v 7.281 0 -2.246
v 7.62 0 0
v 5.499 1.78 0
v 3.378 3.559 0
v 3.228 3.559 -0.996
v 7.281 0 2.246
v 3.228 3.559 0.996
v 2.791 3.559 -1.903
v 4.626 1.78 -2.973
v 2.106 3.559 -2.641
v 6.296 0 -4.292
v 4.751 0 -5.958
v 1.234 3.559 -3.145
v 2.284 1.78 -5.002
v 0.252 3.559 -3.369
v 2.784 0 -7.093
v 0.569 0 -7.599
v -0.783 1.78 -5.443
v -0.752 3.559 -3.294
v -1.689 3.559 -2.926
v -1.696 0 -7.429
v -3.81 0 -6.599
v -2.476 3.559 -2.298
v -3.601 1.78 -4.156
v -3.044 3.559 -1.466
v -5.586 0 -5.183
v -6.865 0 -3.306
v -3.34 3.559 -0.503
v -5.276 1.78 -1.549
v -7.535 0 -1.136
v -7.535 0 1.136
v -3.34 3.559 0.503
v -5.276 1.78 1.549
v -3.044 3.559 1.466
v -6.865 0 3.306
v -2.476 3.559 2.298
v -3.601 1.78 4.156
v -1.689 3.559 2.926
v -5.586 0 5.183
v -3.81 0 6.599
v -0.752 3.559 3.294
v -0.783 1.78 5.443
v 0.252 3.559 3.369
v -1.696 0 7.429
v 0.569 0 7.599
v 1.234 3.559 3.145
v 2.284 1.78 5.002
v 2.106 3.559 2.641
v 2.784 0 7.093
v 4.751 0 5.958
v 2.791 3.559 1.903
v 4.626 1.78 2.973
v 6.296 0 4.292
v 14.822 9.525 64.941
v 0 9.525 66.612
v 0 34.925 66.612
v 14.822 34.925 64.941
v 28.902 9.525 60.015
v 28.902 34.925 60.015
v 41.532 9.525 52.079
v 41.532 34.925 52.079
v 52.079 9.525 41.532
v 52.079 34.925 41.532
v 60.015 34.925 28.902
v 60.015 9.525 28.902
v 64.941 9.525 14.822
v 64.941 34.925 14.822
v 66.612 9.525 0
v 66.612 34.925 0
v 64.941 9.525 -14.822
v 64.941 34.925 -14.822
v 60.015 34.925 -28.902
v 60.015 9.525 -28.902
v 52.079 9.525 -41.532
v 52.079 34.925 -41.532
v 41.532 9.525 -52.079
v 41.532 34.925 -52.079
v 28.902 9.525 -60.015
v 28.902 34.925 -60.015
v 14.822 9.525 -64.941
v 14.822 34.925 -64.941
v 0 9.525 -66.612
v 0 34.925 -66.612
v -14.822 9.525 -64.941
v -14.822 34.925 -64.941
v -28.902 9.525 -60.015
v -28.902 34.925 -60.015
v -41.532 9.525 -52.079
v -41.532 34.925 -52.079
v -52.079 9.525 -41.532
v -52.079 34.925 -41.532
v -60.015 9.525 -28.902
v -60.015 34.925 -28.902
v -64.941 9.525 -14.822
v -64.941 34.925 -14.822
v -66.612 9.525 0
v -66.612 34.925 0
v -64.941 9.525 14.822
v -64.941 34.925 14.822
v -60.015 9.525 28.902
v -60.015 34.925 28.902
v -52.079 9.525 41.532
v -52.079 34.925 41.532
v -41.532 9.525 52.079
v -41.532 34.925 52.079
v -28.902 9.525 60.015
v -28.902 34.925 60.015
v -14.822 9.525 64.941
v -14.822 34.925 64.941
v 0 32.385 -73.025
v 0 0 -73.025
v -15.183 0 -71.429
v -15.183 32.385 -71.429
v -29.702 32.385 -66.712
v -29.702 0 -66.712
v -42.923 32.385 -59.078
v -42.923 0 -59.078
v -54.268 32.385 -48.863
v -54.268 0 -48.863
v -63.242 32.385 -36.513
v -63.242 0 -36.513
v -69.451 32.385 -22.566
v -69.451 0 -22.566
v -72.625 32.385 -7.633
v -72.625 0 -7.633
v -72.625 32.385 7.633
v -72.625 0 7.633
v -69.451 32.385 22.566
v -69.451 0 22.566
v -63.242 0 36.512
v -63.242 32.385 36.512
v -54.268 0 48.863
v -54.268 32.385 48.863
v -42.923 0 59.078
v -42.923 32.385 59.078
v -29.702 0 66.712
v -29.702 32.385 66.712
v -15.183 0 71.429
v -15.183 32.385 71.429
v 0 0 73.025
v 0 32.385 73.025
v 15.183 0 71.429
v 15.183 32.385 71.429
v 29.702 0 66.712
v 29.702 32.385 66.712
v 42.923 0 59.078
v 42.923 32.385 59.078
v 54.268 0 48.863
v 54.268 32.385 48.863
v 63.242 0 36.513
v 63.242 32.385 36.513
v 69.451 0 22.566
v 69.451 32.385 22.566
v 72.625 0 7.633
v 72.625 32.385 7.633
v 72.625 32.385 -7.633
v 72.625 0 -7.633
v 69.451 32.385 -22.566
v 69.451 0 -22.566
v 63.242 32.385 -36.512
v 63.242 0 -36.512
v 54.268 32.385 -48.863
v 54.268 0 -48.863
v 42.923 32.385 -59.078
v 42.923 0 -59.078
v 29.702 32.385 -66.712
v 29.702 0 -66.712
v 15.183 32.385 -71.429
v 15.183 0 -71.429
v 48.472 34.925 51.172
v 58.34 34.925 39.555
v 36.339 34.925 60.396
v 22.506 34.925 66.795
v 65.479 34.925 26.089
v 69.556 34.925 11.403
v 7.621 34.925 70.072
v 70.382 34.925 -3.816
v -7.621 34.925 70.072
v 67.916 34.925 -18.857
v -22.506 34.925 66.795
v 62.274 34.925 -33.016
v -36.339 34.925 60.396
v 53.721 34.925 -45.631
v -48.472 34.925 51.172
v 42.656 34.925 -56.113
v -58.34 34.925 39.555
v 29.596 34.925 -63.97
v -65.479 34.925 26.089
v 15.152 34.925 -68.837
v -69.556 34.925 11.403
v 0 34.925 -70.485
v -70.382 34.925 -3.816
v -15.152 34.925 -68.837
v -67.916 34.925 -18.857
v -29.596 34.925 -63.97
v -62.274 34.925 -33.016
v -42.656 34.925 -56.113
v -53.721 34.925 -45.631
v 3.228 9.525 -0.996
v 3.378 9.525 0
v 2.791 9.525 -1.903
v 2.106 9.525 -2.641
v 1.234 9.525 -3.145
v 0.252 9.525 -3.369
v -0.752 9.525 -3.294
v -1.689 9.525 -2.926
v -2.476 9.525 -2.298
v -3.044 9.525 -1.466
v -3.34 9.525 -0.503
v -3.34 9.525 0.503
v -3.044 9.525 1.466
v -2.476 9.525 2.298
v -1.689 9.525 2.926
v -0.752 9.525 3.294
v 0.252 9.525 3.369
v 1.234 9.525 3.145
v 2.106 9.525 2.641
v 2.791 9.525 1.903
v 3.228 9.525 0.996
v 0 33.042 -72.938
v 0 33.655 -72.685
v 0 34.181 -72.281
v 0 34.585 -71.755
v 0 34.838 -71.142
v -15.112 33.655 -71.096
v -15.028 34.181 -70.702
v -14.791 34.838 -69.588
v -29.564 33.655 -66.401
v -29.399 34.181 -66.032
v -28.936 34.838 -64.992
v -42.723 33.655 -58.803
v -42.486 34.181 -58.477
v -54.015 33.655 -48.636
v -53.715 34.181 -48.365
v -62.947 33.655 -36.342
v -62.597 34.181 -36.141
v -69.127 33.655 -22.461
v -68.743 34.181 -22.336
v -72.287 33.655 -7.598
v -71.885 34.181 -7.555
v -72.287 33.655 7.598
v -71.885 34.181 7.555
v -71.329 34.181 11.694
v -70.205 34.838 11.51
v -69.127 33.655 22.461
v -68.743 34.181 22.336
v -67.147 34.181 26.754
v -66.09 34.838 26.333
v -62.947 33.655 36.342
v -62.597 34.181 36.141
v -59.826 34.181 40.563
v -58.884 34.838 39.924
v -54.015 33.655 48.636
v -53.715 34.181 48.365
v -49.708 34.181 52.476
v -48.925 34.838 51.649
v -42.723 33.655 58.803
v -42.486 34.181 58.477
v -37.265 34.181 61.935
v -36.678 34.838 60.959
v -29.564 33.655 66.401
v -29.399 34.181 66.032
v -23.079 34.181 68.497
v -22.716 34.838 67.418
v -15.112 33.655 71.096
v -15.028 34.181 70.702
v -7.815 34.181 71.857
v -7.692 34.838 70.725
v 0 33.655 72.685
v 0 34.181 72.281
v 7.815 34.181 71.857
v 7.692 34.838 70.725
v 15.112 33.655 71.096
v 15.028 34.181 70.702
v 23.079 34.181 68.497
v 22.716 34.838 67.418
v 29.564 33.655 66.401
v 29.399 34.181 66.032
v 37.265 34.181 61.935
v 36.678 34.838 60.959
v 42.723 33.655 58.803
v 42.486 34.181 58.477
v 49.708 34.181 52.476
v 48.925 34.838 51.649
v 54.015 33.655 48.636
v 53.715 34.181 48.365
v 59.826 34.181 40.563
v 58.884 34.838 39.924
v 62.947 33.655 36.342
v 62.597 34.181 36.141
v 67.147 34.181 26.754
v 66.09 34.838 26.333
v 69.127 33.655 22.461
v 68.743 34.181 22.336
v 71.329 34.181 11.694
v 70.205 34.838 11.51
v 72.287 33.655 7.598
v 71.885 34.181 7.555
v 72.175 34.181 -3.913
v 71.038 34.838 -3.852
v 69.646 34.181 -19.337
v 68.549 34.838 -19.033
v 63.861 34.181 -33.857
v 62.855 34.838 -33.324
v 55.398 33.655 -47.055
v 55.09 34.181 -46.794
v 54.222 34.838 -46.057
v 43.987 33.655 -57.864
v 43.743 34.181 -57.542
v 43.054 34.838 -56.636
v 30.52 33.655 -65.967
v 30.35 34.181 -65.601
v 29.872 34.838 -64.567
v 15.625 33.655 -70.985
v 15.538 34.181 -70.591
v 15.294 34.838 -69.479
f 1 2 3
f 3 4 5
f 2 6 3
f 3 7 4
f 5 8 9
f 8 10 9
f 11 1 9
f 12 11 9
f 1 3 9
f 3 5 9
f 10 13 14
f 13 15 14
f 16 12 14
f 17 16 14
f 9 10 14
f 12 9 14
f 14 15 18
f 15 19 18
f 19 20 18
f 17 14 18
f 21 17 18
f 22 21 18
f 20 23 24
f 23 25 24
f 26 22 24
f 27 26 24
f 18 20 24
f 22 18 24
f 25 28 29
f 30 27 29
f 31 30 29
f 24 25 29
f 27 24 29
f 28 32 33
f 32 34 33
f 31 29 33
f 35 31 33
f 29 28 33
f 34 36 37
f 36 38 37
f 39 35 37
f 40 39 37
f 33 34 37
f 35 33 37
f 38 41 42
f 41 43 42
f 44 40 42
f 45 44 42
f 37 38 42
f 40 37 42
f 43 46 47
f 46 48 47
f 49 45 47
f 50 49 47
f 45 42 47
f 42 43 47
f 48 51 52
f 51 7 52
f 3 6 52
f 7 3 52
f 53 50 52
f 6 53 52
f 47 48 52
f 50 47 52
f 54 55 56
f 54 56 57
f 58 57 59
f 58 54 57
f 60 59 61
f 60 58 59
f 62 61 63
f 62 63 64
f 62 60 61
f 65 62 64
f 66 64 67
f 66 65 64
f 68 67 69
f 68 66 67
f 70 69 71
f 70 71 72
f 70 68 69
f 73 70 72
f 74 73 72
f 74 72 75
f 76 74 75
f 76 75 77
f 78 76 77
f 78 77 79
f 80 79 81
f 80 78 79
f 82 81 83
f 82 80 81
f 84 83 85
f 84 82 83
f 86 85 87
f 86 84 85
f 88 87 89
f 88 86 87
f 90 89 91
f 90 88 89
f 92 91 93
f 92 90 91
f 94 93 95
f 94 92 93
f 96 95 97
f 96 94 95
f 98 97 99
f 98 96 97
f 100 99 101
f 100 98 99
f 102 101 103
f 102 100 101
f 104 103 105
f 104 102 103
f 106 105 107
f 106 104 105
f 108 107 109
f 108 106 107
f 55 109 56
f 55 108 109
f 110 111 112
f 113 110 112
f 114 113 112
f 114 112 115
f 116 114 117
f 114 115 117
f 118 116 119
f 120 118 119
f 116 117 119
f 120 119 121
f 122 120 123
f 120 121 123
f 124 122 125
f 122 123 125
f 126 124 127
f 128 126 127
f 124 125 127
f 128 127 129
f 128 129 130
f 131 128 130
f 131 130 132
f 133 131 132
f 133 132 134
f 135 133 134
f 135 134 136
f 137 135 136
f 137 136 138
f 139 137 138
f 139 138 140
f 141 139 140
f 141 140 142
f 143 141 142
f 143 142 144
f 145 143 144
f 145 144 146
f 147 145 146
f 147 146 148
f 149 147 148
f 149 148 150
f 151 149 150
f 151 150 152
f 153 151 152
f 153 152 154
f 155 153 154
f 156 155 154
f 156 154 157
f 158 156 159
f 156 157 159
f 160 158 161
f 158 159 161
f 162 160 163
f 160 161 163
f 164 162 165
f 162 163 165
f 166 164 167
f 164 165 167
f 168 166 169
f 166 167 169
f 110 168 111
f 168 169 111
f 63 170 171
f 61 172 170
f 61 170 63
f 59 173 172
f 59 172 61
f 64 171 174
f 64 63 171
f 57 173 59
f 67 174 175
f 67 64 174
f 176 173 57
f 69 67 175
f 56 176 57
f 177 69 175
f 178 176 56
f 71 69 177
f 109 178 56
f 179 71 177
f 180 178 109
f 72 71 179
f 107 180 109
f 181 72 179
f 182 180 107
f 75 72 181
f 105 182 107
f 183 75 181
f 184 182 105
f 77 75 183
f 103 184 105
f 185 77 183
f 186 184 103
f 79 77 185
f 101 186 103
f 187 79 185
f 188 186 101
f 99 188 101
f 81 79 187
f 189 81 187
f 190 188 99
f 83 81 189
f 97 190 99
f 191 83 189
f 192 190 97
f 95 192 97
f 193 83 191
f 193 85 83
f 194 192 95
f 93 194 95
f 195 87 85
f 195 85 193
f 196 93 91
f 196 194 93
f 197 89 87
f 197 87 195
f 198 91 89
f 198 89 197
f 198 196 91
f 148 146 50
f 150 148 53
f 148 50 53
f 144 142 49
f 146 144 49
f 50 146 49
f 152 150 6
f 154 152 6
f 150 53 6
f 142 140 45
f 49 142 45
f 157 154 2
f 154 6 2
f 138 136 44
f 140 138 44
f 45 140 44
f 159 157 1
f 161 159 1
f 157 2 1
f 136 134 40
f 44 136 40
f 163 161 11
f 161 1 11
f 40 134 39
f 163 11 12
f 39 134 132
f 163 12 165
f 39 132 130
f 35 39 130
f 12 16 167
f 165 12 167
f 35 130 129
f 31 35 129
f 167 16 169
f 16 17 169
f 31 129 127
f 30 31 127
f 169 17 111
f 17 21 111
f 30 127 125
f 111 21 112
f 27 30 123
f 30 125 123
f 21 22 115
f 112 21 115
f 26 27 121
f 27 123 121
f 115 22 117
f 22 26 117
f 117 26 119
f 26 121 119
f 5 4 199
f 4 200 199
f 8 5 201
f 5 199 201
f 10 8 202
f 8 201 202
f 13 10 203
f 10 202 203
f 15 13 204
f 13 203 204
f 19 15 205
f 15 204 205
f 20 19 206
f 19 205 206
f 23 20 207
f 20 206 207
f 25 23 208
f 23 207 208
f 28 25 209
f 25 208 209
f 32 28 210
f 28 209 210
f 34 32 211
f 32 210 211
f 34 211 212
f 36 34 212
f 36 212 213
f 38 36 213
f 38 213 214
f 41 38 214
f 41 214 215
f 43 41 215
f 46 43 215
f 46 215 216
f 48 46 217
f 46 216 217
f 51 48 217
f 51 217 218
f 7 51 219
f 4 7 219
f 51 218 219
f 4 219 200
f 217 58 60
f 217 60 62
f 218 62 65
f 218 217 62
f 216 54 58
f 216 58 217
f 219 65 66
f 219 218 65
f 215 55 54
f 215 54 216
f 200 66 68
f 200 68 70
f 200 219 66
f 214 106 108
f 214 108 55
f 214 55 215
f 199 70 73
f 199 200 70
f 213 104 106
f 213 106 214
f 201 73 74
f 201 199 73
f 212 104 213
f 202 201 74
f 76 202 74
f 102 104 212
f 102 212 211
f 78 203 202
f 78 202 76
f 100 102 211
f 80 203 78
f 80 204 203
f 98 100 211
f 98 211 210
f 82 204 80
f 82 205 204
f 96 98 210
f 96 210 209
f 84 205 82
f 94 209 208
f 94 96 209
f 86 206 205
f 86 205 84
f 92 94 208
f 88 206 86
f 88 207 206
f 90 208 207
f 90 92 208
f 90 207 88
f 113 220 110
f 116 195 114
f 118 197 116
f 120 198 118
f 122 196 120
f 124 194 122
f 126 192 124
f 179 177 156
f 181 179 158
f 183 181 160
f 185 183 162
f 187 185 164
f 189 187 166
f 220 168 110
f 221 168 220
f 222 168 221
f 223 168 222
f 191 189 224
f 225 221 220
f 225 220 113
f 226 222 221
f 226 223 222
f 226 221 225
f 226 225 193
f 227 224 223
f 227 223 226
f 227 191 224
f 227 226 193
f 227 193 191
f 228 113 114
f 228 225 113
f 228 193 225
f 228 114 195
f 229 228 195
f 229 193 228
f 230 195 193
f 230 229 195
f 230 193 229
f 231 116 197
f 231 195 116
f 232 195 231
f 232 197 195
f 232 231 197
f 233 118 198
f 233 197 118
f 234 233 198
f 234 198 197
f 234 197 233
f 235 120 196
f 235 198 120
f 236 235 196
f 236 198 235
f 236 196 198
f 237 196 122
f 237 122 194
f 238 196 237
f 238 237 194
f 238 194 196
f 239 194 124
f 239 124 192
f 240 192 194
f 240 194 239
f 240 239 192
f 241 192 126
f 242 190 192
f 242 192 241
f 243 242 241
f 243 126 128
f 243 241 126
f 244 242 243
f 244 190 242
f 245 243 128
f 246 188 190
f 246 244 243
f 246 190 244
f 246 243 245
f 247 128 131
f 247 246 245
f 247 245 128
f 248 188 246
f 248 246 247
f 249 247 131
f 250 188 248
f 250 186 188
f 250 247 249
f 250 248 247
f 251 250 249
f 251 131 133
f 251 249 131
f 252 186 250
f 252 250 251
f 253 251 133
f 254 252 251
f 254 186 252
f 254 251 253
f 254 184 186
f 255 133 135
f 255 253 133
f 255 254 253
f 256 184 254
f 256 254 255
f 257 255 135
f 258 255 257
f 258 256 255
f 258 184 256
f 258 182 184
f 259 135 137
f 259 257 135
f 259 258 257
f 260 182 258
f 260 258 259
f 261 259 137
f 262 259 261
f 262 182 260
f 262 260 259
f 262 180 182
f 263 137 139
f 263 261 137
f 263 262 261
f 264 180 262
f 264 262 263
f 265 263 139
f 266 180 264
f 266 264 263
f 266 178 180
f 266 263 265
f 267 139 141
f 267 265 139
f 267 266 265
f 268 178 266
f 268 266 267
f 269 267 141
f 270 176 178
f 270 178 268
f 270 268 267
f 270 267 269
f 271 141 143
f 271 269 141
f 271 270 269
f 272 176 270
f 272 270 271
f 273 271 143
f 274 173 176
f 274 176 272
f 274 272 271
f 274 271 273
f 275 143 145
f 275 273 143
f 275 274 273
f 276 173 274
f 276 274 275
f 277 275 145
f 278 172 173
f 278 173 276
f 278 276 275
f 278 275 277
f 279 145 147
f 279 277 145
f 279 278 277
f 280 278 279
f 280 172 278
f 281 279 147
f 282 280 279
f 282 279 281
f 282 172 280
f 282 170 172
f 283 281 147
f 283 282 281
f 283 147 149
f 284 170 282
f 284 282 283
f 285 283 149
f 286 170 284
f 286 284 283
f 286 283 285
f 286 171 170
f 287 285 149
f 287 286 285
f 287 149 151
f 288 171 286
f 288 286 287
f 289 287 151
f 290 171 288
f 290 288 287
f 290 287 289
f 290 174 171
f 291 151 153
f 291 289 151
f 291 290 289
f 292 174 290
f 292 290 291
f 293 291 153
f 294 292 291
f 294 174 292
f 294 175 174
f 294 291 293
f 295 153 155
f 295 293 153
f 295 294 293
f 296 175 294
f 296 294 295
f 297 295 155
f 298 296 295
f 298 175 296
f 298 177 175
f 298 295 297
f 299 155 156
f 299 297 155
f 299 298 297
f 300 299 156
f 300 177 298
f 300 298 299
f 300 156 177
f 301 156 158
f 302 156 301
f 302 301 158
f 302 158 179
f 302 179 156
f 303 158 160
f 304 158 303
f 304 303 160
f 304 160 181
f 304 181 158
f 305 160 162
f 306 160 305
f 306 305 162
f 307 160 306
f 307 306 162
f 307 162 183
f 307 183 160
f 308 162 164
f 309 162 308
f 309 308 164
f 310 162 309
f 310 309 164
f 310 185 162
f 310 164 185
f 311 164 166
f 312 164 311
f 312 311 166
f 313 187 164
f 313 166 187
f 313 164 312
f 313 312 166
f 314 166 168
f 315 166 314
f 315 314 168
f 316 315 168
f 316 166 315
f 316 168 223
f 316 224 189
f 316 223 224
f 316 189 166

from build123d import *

# Parameters (mm, degrees)
SKETCH1_R                                           = 73.025
BOSS_EXTRUDE1_DEPTH                                 = 9.525
SKETCH2_R                                           = 73.025
SKETCH2_R_2                                         = 66.6115
BOSS_EXTRUDE2_DEPTH                                 = 25.4
CSK_FOR_1_4_FLAT_HEAD_MACHINE_SCREW_100_D           = 6.7564
CSK_FOR_1_4_FLAT_HEAD_MACHINE_SCREW_100_DEPTH       = 10.16
CSK_FOR_1_4_FLAT_HEAD_MACHINE_SCREW_100_CSINK_D     = 15.24
CSK_FOR_1_4_FLAT_HEAD_MACHINE_SCREW_100_CSINK_ANGLE = 100
CSK_FOR_1_4_FLAT_HEAD_MACHINE_SCREW_100_TIP         = 2.029827343
FILLET1_R                                           = 2.54


with BuildPart() as part:
    # Sketch1 → Boss-Extrude1 (new body)
    with BuildSketch(Plane(origin=(0, 0, 0), x_dir=(1, 0, 0), z_dir=(0, 1, 0))):
        with Locations(Location((0, 0, 0), (0, 0, 90))):
            Circle(SKETCH1_R)
    extrude(amount=BOSS_EXTRUDE1_DEPTH)

    # Sketch2 → Boss-Extrude2 (add)
    with BuildSketch(Plane(origin=(0, 9.525, 0), x_dir=(1, 0, 0), z_dir=(0, 1, 0))):
        with Locations(Location((0, 0, 0), (0, 0, 90))):
            Circle(SKETCH2_R)
        with Locations(Location((0, 0, 0), (0, 0, 270))):
            Circle(SKETCH2_R_2, mode=Mode.SUBTRACT)
    extrude(amount=BOSS_EXTRUDE2_DEPTH)

    # CSK for 1/4 Flat Head Machine Screw (100)1
    with Locations(Plane(origin=(0, 0, 0), x_dir=(-1, 0, 0), z_dir=(0, -1, 0))):
        with Locations((0, 0)):
            CounterSinkHole(CSK_FOR_1_4_FLAT_HEAD_MACHINE_SCREW_100_D / 2, CSK_FOR_1_4_FLAT_HEAD_MACHINE_SCREW_100_CSINK_D / 2, depth=CSK_FOR_1_4_FLAT_HEAD_MACHINE_SCREW_100_DEPTH, counter_sink_angle=CSK_FOR_1_4_FLAT_HEAD_MACHINE_SCREW_100_CSINK_ANGLE)
            with Locations((0, 0, -(CSK_FOR_1_4_FLAT_HEAD_MACHINE_SCREW_100_DEPTH + CSK_FOR_1_4_FLAT_HEAD_MACHINE_SCREW_100_TIP / 2))):  # 118° drill point
                Cone(0, CSK_FOR_1_4_FLAT_HEAD_MACHINE_SCREW_100_D / 2, CSK_FOR_1_4_FLAT_HEAD_MACHINE_SCREW_100_TIP, mode=Mode.SUBTRACT)

    # Fillet1
    fillet1_edges = [part.edges().sort_by_distance(p)[0] for p in [
        (0, 34.925, 73.025),
    ]]
    fillet(fillet1_edges, radius=FILLET1_R)


solid = part.part
